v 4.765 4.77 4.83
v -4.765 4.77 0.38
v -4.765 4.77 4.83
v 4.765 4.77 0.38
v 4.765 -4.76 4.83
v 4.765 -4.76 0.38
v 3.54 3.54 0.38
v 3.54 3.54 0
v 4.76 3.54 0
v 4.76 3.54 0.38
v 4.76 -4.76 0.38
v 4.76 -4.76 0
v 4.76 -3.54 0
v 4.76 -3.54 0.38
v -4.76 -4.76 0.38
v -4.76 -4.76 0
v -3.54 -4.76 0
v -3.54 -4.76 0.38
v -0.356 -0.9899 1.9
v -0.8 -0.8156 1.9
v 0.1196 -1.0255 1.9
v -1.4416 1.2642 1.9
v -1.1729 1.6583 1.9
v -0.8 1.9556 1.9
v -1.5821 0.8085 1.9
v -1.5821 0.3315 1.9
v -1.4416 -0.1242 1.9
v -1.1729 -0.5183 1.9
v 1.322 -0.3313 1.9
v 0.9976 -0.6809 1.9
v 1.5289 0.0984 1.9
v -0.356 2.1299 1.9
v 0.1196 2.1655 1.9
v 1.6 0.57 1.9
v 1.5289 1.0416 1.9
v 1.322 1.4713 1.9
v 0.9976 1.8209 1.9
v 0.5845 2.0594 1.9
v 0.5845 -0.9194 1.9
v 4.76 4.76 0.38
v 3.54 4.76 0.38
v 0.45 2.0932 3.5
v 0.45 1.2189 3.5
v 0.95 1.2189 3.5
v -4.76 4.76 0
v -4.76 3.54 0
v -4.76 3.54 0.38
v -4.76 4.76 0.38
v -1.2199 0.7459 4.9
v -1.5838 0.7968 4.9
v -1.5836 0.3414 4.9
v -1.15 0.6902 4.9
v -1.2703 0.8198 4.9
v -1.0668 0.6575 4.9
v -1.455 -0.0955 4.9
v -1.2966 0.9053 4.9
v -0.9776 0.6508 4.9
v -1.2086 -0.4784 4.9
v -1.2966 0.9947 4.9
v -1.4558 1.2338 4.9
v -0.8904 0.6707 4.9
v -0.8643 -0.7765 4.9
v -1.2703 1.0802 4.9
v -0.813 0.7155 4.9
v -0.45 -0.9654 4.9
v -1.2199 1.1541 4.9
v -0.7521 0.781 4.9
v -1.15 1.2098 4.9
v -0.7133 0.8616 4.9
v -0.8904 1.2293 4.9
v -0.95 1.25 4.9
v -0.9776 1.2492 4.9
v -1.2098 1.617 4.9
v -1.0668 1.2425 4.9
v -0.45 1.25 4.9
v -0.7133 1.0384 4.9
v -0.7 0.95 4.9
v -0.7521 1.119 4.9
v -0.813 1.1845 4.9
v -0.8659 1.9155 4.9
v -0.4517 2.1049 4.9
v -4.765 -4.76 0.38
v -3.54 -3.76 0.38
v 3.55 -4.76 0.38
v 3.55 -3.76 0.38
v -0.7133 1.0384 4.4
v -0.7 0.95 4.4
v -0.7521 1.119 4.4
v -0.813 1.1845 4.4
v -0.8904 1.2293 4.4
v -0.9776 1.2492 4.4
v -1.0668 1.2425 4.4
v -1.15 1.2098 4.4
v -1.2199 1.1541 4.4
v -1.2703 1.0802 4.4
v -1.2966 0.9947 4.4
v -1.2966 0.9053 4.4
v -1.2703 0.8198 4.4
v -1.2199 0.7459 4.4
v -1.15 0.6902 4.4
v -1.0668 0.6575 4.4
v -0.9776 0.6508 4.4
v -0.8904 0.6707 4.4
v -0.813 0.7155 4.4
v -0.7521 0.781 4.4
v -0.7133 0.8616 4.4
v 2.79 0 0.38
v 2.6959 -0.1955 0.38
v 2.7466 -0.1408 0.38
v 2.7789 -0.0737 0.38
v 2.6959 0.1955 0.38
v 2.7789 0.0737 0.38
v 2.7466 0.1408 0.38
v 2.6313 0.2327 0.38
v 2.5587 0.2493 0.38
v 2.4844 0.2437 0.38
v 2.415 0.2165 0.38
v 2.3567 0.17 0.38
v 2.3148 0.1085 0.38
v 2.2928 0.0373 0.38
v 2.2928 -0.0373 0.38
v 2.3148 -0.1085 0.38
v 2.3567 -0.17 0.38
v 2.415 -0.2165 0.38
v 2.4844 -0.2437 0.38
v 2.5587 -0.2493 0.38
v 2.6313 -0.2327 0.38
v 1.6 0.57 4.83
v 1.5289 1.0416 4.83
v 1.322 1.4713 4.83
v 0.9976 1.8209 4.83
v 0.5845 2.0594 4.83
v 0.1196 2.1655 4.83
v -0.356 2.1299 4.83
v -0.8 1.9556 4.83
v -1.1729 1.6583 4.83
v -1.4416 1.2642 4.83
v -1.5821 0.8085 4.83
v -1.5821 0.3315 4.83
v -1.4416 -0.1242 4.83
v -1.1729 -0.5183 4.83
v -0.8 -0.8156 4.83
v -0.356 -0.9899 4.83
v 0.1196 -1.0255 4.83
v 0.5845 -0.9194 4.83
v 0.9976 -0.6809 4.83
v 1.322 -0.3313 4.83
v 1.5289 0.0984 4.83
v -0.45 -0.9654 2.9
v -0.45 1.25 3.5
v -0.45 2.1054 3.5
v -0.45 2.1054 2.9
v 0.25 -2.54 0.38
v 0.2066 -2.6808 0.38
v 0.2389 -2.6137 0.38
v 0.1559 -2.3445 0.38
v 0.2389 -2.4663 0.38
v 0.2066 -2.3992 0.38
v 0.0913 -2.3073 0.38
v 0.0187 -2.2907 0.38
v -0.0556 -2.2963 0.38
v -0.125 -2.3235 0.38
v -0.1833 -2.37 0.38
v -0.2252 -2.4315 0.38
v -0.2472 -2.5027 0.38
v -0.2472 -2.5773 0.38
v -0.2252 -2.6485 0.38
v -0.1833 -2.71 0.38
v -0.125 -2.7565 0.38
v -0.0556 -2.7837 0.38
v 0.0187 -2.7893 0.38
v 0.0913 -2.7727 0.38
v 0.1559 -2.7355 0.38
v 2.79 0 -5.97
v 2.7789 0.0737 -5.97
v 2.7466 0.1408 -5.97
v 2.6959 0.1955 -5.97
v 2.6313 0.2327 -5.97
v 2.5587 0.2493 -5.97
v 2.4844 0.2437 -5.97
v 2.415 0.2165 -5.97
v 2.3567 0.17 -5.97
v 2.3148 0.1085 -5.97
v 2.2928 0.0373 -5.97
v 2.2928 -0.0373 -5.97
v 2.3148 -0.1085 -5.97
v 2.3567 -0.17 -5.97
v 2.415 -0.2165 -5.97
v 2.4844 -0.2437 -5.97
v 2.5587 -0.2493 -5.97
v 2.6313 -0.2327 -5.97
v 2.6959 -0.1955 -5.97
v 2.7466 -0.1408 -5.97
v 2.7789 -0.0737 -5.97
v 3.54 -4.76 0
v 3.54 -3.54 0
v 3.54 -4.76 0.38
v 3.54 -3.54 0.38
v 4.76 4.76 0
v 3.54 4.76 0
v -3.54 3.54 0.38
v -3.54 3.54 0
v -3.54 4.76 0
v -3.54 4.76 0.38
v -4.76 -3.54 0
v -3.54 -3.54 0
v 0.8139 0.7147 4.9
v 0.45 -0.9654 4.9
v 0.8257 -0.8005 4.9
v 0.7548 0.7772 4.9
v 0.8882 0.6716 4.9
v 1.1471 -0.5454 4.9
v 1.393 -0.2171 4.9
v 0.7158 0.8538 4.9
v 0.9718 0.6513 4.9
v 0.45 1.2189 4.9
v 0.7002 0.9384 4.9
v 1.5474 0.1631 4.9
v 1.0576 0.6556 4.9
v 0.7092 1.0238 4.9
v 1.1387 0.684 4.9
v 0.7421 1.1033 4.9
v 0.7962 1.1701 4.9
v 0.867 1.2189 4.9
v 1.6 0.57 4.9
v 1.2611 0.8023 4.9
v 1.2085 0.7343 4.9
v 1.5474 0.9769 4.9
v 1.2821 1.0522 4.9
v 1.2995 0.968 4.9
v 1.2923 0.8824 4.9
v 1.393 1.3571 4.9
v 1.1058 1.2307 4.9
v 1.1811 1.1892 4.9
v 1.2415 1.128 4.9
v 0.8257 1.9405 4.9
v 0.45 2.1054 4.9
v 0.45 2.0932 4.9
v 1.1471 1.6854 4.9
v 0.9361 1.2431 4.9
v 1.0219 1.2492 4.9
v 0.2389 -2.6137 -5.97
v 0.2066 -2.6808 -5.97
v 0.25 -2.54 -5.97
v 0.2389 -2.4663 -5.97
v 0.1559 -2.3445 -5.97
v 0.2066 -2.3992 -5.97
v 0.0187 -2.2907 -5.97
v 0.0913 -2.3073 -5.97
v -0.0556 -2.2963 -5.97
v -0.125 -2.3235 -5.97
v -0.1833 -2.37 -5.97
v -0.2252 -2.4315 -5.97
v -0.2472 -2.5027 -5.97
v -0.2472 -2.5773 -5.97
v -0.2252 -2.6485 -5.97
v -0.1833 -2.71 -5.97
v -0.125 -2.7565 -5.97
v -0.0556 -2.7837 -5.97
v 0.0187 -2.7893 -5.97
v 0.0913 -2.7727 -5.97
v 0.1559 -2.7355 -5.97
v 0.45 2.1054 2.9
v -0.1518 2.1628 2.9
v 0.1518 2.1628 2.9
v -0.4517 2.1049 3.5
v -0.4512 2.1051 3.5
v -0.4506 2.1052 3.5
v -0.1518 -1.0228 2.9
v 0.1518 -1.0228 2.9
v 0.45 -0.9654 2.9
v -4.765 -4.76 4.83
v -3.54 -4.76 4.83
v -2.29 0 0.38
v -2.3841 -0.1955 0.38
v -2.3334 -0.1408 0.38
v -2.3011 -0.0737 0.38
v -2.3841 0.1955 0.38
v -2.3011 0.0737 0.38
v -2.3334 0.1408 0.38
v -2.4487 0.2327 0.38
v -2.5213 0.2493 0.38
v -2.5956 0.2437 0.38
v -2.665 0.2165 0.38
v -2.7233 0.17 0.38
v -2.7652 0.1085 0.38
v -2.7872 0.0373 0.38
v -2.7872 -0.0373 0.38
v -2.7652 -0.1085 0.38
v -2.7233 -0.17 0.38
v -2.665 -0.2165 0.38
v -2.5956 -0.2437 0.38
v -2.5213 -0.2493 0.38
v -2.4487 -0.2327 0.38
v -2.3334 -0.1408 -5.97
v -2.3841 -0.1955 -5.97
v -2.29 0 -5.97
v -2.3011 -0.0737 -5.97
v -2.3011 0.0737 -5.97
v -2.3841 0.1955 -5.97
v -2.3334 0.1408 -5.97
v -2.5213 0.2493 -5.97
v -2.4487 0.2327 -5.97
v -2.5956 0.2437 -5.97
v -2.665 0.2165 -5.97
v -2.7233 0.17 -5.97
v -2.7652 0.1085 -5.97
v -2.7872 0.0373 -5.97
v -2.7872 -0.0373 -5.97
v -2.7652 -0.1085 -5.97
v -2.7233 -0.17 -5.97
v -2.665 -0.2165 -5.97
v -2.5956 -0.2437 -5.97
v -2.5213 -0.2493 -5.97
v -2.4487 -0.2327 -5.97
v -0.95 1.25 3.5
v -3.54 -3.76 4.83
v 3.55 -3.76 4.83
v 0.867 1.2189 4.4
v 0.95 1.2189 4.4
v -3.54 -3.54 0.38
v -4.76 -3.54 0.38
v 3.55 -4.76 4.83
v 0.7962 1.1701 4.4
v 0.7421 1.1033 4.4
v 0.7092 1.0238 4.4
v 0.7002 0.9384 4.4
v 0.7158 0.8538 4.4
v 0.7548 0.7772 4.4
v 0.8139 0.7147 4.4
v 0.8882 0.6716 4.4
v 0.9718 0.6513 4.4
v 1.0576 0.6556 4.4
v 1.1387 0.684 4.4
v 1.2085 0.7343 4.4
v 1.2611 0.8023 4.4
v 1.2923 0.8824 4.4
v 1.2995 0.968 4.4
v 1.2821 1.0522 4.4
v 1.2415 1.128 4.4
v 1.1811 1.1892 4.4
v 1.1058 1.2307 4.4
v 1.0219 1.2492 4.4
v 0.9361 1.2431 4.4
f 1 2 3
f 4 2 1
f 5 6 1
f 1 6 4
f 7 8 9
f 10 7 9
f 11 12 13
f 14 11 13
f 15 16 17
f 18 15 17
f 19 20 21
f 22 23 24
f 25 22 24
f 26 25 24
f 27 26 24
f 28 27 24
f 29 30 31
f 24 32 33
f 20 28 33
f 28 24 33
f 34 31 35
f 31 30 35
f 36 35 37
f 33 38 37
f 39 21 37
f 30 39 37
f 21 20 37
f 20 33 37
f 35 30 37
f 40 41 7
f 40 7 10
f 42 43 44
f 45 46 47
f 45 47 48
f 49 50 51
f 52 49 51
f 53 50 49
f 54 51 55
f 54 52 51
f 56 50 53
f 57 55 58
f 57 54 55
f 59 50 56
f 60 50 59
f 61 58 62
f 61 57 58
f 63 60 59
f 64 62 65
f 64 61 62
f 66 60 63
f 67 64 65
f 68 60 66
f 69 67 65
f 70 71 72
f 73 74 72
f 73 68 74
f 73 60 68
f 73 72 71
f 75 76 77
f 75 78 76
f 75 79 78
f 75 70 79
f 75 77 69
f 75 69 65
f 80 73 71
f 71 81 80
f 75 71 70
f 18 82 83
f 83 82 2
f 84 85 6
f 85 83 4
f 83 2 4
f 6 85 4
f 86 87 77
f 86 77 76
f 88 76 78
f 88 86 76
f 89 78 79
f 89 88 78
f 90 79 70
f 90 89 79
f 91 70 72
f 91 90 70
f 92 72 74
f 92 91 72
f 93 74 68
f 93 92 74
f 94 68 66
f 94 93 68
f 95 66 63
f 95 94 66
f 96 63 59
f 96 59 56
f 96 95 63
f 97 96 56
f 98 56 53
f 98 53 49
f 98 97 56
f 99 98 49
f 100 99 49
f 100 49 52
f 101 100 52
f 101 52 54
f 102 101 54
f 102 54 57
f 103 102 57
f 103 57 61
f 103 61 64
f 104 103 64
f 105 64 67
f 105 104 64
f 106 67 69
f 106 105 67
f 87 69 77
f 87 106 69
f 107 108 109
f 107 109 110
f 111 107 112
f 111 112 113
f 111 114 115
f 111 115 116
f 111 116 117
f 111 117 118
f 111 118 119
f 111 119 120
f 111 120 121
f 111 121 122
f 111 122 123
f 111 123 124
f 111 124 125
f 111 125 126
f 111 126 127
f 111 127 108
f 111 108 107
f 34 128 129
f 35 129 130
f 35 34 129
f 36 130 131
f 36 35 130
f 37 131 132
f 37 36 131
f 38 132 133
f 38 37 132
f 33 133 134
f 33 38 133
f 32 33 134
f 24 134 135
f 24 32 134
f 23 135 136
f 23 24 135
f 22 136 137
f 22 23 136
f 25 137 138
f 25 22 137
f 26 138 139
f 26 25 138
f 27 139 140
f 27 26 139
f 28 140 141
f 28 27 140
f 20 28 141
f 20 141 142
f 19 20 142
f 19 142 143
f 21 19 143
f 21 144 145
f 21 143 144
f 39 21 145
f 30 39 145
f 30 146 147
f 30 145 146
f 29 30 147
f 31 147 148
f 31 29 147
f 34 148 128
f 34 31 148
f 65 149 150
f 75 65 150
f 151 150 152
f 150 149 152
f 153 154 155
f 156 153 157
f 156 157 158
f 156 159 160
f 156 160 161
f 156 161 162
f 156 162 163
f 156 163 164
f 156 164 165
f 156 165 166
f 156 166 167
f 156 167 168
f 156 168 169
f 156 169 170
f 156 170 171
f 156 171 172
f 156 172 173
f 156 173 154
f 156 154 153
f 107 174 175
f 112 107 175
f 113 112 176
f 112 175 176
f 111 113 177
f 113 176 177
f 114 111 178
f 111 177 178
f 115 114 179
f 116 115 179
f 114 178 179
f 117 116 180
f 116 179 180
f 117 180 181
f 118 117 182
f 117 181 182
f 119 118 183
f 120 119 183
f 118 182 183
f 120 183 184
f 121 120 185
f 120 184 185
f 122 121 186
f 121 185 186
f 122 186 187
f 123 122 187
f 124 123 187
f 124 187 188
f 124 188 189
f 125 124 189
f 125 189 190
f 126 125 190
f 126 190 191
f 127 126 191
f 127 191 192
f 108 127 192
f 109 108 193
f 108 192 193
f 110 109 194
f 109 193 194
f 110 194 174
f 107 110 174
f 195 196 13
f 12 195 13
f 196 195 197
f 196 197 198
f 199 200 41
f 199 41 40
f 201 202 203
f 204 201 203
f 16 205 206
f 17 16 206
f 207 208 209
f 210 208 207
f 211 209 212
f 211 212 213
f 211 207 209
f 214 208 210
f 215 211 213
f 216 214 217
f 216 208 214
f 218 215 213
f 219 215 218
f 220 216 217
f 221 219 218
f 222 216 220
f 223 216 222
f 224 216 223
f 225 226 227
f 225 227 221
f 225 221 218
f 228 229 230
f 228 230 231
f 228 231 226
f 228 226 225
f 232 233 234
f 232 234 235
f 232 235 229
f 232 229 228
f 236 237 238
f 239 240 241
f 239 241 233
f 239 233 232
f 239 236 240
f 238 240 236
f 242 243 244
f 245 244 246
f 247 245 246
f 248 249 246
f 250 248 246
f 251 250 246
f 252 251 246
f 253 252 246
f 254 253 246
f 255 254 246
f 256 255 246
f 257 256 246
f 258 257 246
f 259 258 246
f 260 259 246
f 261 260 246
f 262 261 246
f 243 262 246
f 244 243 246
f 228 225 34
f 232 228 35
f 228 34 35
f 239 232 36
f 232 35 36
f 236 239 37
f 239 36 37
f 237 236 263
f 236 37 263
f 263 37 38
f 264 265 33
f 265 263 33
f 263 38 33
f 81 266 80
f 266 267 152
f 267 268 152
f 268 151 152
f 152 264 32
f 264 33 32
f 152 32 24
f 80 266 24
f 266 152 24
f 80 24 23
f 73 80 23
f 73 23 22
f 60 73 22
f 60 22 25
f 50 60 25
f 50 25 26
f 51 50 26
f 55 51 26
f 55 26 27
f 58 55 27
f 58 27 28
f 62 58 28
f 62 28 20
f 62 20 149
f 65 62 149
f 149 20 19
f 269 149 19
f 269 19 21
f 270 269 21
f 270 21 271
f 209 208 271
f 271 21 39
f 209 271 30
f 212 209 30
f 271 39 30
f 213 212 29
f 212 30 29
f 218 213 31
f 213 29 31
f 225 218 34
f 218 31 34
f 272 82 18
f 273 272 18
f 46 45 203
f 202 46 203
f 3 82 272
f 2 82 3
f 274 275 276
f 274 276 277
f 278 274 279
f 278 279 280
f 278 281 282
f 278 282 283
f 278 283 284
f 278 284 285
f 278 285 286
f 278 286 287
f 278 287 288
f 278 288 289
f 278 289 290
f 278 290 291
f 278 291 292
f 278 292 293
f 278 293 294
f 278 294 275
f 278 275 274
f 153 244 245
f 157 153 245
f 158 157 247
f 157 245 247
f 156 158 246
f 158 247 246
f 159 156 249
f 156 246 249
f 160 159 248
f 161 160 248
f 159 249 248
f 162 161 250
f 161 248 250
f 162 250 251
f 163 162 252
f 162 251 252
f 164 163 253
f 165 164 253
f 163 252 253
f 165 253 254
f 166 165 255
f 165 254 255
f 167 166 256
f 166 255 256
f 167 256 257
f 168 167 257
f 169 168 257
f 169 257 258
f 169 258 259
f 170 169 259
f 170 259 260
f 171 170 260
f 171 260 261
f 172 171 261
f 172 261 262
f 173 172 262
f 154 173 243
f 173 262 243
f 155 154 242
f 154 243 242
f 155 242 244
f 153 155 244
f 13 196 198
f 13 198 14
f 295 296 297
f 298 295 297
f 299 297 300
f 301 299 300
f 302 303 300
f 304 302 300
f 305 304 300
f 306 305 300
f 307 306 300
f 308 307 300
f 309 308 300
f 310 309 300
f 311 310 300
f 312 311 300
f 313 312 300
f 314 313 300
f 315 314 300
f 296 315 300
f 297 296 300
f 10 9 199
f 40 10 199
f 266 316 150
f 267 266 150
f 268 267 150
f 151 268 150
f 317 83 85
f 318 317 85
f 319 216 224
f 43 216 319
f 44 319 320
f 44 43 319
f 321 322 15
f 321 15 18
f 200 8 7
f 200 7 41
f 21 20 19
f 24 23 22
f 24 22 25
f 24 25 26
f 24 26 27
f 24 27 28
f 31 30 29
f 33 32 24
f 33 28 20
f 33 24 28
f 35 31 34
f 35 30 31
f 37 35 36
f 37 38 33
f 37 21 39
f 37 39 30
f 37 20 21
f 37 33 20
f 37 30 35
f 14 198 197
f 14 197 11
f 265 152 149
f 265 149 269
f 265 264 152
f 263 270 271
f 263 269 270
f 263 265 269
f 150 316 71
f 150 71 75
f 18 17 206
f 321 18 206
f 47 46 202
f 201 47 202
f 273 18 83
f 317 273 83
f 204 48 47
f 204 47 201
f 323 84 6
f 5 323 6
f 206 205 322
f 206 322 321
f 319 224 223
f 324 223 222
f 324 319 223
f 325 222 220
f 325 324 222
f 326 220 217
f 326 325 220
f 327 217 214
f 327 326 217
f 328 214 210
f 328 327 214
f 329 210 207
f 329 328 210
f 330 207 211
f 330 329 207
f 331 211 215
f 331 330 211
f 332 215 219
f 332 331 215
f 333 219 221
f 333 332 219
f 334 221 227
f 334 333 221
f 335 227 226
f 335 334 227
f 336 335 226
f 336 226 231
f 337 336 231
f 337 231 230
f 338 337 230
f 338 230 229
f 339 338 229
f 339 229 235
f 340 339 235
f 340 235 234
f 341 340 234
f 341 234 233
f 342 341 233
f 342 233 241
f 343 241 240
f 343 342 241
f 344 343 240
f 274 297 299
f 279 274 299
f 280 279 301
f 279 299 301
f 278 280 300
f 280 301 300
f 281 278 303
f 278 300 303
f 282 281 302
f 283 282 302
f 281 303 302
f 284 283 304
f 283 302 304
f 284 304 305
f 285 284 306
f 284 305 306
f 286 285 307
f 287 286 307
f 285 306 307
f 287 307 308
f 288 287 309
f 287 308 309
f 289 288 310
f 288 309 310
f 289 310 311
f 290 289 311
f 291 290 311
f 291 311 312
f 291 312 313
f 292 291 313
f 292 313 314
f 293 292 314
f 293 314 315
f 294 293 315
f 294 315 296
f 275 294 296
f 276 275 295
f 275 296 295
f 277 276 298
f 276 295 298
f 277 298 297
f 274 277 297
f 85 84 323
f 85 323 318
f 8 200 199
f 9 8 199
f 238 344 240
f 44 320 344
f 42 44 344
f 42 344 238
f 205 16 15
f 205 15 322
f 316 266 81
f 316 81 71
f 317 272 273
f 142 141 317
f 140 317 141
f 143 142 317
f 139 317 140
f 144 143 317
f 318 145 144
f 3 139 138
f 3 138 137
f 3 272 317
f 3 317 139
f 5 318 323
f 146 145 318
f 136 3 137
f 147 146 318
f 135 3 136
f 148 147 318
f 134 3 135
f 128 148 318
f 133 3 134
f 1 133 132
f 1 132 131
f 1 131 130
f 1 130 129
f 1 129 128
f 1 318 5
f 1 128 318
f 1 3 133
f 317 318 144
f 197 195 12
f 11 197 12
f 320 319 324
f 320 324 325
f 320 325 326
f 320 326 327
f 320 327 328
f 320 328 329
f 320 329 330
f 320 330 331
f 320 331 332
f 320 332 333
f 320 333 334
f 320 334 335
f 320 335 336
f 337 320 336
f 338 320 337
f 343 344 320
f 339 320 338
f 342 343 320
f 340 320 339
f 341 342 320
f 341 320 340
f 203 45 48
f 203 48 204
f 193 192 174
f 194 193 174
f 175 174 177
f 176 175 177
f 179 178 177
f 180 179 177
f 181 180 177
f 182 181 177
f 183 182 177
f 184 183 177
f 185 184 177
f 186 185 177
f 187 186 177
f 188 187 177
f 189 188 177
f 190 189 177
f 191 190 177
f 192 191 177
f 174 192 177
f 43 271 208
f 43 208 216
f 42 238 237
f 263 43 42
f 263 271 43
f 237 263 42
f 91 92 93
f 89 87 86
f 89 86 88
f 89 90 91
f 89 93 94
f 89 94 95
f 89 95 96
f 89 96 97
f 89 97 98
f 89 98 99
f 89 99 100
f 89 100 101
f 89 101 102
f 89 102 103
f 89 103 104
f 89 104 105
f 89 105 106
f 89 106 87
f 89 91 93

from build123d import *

# Parameters (mm, degrees)
BOX001_W          = 1.22
BOX001_H          = 1.22
BOX001_DEPTH      = 0.38
BOX002_W          = 1.22
BOX002_H          = 1.22
BOX002_DEPTH      = 0.38
BOX003_W          = 1.22
BOX003_H          = 1.22
BOX003_DEPTH      = 0.38
BOX004_W          = 1.22
BOX004_H          = 1.22
BOX004_DEPTH      = 0.38
CYLINDER_R        = 0.25
CYLINDER_DEPTH    = 6.35
CYLINDER001_R     = 0.25
CYLINDER001_DEPTH = 6.35
CYLINDER002_R     = 0.25
CYLINDER002_DEPTH = 6.35
CYLINDER003_R     = 1.6
CYLINDER003_DEPTH = 3
BOX005_W          = 7.09
BOX005_H          = 1
BOX005_DEPTH      = 4.45
BOX_W             = 9.53
BOX_H             = 9.53
BOX_DEPTH         = 4.45
BOX006_W          = 0.9
BOX006_H          = 3.4
BOX006_DEPTH      = 2
CYLINDER004_R     = 0.3
CYLINDER004_DEPTH = 0.5
CYLINDER005_R     = 0.3
CYLINDER005_DEPTH = 0.5
PAD_DEPTH         = 1.4
CYLINDER006_R     = 1.6
CYLINDER006_DEPTH = 3


with BuildPart() as cube001:
    # Box001 → Box001 (new body)
    with BuildSketch(Plane(origin=(-4.76, -4.76, 0), x_dir=(1, 0, 0), z_dir=(0, 0, 1))):
        with Locations((0.61, 0.61)):
            Rectangle(BOX001_W, BOX001_H)
    extrude(amount=BOX001_DEPTH)


with BuildPart() as cube002:
    # Box002 → Box002 (new body)
    with BuildSketch(Plane(origin=(-4.76, 3.54, 0), x_dir=(1, 0, 0), z_dir=(0, 0, 1))):
        with Locations((0.61, 0.61)):
            Rectangle(BOX002_W, BOX002_H)
    extrude(amount=BOX002_DEPTH)


with BuildPart() as cube003:
    # Box003 → Box003 (new body)
    with BuildSketch(Plane(origin=(3.54, -4.76, 0), x_dir=(1, 0, 0), z_dir=(0, 0, 1))):
        with Locations((0.61, 0.61)):
            Rectangle(BOX003_W, BOX003_H)
    extrude(amount=BOX003_DEPTH)


with BuildPart() as cube004:
    # Box004 → Box004 (new body)
    with BuildSketch(Plane(origin=(3.54, 3.54, 0), x_dir=(1, 0, 0), z_dir=(0, 0, 1))):
        with Locations((0.61, 0.61)):
            Rectangle(BOX004_W, BOX004_H)
    extrude(amount=BOX004_DEPTH)


with BuildPart() as cylinder:
    # Cylinder → Cylinder (new body)
    with BuildSketch(Plane(origin=(2.54, 0, -5.97), x_dir=(1, 0, 0), z_dir=(0, 0, 1))):
        Circle(CYLINDER_R)
    extrude(amount=CYLINDER_DEPTH)


with BuildPart() as cylinder001:
    # Cylinder001 → Cylinder001 (new body)
    with BuildSketch(Plane(origin=(-2.54, 0, -5.97), x_dir=(1, 0, 0), z_dir=(0, 0, 1))):
        Circle(CYLINDER001_R)
    extrude(amount=CYLINDER001_DEPTH)


with BuildPart() as cylinder002:
    # Cylinder002 → Cylinder002 (new body)
    with BuildSketch(Plane(origin=(0, -2.54, -5.97), x_dir=(1, 0, 0), z_dir=(0, 0, 1))):
        Circle(CYLINDER002_R)
    extrude(amount=CYLINDER002_DEPTH)


with BuildPart() as cylinder003:
    # Cylinder003 → Cylinder003 (new body)
    with BuildSketch(Plane(origin=(0, 0.57, 1.9), x_dir=(1, 0, 0), z_dir=(0, 0, 1))):
        Circle(CYLINDER003_R)
    extrude(amount=CYLINDER003_DEPTH)


with BuildPart() as cube005:
    # Box005 → Box005 (new body)
    with BuildSketch(Plane(origin=(-3.54, -4.76, 0.38), x_dir=(1, 0, 0), z_dir=(0, 0, 1))):
        with Locations((3.545, 0.5)):
            Rectangle(BOX005_W, BOX005_H)
    extrude(amount=BOX005_DEPTH)


with BuildPart() as cut002:
    # Box → Box (new body)
    with BuildSketch(Plane(origin=(-4.765, -4.76, 0.38), x_dir=(1, 0, 0), z_dir=(0, 0, 1))):
        with Locations((4.765, 4.765)):
            Rectangle(BOX_W, BOX_H)
    extrude(amount=BOX_DEPTH)

    # Cut: cut Cube005
    add(cube005.part, mode=Mode.SUBTRACT)

    # Cut002: cut Cylinder003
    add(cylinder003.part, mode=Mode.SUBTRACT)


with BuildPart() as cube006:
    # Box006 → Box006 (new body)
    with BuildSketch(Plane(origin=(-0.45, -1.1, 2.9), x_dir=(1, 0, 0), z_dir=(0, 0, 1))):
        with Locations((0.45, 1.7)):
            Rectangle(BOX006_W, BOX006_H)
    extrude(amount=BOX006_DEPTH)


with BuildPart() as cylinder004:
    # Cylinder004 → Cylinder004 (new body)
    with BuildSketch(Plane(origin=(-1, 0.95, 4.4), x_dir=(1, 0, 0), z_dir=(0, 0, 1))):
        Circle(CYLINDER004_R)
    extrude(amount=CYLINDER004_DEPTH)


with BuildPart() as cylinder005:
    # Cylinder005 → Cylinder005 (new body)
    with BuildSketch(Plane(origin=(1, 0.95, 4.4), x_dir=(1, 0, 0), z_dir=(0, 0, 1))):
        Circle(CYLINDER005_R)
    extrude(amount=CYLINDER005_DEPTH)


with BuildPart() as fusion:
    # Sketch → Pad (new body)
    with BuildSketch(Plane.XY):
        Polygon((-0.45, -1.1), (0.45, -1.1), (0.45, 1.218883), (0.95, 1.218883), (0, 2.88), (-0.95, 1.25), (-0.45, 1.25), align=None)
    extrude(amount=PAD_DEPTH)


with BuildPart() as fusion_1:
    # Body placement: moved
    add(fusion.part.moved(Location((0, 0, 3.5))))

    # Fusion: union Cube006, Cylinder004, Cylinder005
    add(cube006.part)
    add(cylinder004.part)
    add(cylinder005.part)


with BuildPart() as cut003:
    # Cylinder006 → Cylinder006 (new body)
    with BuildSketch(Plane(origin=(0, 0.57, 1.9), x_dir=(1, 0, 0), z_dir=(0, 0, 1))):
        Circle(CYLINDER006_R)
    extrude(amount=CYLINDER006_DEPTH)

    # Cut003: cut Fusion
    add(fusion_1.part, mode=Mode.SUBTRACT)


solid = Compound([cube001.part, cube002.part, cube003.part, cube004.part, cylinder.part, cylinder001.part, cylinder002.part, cut002.part, cut003.part])
